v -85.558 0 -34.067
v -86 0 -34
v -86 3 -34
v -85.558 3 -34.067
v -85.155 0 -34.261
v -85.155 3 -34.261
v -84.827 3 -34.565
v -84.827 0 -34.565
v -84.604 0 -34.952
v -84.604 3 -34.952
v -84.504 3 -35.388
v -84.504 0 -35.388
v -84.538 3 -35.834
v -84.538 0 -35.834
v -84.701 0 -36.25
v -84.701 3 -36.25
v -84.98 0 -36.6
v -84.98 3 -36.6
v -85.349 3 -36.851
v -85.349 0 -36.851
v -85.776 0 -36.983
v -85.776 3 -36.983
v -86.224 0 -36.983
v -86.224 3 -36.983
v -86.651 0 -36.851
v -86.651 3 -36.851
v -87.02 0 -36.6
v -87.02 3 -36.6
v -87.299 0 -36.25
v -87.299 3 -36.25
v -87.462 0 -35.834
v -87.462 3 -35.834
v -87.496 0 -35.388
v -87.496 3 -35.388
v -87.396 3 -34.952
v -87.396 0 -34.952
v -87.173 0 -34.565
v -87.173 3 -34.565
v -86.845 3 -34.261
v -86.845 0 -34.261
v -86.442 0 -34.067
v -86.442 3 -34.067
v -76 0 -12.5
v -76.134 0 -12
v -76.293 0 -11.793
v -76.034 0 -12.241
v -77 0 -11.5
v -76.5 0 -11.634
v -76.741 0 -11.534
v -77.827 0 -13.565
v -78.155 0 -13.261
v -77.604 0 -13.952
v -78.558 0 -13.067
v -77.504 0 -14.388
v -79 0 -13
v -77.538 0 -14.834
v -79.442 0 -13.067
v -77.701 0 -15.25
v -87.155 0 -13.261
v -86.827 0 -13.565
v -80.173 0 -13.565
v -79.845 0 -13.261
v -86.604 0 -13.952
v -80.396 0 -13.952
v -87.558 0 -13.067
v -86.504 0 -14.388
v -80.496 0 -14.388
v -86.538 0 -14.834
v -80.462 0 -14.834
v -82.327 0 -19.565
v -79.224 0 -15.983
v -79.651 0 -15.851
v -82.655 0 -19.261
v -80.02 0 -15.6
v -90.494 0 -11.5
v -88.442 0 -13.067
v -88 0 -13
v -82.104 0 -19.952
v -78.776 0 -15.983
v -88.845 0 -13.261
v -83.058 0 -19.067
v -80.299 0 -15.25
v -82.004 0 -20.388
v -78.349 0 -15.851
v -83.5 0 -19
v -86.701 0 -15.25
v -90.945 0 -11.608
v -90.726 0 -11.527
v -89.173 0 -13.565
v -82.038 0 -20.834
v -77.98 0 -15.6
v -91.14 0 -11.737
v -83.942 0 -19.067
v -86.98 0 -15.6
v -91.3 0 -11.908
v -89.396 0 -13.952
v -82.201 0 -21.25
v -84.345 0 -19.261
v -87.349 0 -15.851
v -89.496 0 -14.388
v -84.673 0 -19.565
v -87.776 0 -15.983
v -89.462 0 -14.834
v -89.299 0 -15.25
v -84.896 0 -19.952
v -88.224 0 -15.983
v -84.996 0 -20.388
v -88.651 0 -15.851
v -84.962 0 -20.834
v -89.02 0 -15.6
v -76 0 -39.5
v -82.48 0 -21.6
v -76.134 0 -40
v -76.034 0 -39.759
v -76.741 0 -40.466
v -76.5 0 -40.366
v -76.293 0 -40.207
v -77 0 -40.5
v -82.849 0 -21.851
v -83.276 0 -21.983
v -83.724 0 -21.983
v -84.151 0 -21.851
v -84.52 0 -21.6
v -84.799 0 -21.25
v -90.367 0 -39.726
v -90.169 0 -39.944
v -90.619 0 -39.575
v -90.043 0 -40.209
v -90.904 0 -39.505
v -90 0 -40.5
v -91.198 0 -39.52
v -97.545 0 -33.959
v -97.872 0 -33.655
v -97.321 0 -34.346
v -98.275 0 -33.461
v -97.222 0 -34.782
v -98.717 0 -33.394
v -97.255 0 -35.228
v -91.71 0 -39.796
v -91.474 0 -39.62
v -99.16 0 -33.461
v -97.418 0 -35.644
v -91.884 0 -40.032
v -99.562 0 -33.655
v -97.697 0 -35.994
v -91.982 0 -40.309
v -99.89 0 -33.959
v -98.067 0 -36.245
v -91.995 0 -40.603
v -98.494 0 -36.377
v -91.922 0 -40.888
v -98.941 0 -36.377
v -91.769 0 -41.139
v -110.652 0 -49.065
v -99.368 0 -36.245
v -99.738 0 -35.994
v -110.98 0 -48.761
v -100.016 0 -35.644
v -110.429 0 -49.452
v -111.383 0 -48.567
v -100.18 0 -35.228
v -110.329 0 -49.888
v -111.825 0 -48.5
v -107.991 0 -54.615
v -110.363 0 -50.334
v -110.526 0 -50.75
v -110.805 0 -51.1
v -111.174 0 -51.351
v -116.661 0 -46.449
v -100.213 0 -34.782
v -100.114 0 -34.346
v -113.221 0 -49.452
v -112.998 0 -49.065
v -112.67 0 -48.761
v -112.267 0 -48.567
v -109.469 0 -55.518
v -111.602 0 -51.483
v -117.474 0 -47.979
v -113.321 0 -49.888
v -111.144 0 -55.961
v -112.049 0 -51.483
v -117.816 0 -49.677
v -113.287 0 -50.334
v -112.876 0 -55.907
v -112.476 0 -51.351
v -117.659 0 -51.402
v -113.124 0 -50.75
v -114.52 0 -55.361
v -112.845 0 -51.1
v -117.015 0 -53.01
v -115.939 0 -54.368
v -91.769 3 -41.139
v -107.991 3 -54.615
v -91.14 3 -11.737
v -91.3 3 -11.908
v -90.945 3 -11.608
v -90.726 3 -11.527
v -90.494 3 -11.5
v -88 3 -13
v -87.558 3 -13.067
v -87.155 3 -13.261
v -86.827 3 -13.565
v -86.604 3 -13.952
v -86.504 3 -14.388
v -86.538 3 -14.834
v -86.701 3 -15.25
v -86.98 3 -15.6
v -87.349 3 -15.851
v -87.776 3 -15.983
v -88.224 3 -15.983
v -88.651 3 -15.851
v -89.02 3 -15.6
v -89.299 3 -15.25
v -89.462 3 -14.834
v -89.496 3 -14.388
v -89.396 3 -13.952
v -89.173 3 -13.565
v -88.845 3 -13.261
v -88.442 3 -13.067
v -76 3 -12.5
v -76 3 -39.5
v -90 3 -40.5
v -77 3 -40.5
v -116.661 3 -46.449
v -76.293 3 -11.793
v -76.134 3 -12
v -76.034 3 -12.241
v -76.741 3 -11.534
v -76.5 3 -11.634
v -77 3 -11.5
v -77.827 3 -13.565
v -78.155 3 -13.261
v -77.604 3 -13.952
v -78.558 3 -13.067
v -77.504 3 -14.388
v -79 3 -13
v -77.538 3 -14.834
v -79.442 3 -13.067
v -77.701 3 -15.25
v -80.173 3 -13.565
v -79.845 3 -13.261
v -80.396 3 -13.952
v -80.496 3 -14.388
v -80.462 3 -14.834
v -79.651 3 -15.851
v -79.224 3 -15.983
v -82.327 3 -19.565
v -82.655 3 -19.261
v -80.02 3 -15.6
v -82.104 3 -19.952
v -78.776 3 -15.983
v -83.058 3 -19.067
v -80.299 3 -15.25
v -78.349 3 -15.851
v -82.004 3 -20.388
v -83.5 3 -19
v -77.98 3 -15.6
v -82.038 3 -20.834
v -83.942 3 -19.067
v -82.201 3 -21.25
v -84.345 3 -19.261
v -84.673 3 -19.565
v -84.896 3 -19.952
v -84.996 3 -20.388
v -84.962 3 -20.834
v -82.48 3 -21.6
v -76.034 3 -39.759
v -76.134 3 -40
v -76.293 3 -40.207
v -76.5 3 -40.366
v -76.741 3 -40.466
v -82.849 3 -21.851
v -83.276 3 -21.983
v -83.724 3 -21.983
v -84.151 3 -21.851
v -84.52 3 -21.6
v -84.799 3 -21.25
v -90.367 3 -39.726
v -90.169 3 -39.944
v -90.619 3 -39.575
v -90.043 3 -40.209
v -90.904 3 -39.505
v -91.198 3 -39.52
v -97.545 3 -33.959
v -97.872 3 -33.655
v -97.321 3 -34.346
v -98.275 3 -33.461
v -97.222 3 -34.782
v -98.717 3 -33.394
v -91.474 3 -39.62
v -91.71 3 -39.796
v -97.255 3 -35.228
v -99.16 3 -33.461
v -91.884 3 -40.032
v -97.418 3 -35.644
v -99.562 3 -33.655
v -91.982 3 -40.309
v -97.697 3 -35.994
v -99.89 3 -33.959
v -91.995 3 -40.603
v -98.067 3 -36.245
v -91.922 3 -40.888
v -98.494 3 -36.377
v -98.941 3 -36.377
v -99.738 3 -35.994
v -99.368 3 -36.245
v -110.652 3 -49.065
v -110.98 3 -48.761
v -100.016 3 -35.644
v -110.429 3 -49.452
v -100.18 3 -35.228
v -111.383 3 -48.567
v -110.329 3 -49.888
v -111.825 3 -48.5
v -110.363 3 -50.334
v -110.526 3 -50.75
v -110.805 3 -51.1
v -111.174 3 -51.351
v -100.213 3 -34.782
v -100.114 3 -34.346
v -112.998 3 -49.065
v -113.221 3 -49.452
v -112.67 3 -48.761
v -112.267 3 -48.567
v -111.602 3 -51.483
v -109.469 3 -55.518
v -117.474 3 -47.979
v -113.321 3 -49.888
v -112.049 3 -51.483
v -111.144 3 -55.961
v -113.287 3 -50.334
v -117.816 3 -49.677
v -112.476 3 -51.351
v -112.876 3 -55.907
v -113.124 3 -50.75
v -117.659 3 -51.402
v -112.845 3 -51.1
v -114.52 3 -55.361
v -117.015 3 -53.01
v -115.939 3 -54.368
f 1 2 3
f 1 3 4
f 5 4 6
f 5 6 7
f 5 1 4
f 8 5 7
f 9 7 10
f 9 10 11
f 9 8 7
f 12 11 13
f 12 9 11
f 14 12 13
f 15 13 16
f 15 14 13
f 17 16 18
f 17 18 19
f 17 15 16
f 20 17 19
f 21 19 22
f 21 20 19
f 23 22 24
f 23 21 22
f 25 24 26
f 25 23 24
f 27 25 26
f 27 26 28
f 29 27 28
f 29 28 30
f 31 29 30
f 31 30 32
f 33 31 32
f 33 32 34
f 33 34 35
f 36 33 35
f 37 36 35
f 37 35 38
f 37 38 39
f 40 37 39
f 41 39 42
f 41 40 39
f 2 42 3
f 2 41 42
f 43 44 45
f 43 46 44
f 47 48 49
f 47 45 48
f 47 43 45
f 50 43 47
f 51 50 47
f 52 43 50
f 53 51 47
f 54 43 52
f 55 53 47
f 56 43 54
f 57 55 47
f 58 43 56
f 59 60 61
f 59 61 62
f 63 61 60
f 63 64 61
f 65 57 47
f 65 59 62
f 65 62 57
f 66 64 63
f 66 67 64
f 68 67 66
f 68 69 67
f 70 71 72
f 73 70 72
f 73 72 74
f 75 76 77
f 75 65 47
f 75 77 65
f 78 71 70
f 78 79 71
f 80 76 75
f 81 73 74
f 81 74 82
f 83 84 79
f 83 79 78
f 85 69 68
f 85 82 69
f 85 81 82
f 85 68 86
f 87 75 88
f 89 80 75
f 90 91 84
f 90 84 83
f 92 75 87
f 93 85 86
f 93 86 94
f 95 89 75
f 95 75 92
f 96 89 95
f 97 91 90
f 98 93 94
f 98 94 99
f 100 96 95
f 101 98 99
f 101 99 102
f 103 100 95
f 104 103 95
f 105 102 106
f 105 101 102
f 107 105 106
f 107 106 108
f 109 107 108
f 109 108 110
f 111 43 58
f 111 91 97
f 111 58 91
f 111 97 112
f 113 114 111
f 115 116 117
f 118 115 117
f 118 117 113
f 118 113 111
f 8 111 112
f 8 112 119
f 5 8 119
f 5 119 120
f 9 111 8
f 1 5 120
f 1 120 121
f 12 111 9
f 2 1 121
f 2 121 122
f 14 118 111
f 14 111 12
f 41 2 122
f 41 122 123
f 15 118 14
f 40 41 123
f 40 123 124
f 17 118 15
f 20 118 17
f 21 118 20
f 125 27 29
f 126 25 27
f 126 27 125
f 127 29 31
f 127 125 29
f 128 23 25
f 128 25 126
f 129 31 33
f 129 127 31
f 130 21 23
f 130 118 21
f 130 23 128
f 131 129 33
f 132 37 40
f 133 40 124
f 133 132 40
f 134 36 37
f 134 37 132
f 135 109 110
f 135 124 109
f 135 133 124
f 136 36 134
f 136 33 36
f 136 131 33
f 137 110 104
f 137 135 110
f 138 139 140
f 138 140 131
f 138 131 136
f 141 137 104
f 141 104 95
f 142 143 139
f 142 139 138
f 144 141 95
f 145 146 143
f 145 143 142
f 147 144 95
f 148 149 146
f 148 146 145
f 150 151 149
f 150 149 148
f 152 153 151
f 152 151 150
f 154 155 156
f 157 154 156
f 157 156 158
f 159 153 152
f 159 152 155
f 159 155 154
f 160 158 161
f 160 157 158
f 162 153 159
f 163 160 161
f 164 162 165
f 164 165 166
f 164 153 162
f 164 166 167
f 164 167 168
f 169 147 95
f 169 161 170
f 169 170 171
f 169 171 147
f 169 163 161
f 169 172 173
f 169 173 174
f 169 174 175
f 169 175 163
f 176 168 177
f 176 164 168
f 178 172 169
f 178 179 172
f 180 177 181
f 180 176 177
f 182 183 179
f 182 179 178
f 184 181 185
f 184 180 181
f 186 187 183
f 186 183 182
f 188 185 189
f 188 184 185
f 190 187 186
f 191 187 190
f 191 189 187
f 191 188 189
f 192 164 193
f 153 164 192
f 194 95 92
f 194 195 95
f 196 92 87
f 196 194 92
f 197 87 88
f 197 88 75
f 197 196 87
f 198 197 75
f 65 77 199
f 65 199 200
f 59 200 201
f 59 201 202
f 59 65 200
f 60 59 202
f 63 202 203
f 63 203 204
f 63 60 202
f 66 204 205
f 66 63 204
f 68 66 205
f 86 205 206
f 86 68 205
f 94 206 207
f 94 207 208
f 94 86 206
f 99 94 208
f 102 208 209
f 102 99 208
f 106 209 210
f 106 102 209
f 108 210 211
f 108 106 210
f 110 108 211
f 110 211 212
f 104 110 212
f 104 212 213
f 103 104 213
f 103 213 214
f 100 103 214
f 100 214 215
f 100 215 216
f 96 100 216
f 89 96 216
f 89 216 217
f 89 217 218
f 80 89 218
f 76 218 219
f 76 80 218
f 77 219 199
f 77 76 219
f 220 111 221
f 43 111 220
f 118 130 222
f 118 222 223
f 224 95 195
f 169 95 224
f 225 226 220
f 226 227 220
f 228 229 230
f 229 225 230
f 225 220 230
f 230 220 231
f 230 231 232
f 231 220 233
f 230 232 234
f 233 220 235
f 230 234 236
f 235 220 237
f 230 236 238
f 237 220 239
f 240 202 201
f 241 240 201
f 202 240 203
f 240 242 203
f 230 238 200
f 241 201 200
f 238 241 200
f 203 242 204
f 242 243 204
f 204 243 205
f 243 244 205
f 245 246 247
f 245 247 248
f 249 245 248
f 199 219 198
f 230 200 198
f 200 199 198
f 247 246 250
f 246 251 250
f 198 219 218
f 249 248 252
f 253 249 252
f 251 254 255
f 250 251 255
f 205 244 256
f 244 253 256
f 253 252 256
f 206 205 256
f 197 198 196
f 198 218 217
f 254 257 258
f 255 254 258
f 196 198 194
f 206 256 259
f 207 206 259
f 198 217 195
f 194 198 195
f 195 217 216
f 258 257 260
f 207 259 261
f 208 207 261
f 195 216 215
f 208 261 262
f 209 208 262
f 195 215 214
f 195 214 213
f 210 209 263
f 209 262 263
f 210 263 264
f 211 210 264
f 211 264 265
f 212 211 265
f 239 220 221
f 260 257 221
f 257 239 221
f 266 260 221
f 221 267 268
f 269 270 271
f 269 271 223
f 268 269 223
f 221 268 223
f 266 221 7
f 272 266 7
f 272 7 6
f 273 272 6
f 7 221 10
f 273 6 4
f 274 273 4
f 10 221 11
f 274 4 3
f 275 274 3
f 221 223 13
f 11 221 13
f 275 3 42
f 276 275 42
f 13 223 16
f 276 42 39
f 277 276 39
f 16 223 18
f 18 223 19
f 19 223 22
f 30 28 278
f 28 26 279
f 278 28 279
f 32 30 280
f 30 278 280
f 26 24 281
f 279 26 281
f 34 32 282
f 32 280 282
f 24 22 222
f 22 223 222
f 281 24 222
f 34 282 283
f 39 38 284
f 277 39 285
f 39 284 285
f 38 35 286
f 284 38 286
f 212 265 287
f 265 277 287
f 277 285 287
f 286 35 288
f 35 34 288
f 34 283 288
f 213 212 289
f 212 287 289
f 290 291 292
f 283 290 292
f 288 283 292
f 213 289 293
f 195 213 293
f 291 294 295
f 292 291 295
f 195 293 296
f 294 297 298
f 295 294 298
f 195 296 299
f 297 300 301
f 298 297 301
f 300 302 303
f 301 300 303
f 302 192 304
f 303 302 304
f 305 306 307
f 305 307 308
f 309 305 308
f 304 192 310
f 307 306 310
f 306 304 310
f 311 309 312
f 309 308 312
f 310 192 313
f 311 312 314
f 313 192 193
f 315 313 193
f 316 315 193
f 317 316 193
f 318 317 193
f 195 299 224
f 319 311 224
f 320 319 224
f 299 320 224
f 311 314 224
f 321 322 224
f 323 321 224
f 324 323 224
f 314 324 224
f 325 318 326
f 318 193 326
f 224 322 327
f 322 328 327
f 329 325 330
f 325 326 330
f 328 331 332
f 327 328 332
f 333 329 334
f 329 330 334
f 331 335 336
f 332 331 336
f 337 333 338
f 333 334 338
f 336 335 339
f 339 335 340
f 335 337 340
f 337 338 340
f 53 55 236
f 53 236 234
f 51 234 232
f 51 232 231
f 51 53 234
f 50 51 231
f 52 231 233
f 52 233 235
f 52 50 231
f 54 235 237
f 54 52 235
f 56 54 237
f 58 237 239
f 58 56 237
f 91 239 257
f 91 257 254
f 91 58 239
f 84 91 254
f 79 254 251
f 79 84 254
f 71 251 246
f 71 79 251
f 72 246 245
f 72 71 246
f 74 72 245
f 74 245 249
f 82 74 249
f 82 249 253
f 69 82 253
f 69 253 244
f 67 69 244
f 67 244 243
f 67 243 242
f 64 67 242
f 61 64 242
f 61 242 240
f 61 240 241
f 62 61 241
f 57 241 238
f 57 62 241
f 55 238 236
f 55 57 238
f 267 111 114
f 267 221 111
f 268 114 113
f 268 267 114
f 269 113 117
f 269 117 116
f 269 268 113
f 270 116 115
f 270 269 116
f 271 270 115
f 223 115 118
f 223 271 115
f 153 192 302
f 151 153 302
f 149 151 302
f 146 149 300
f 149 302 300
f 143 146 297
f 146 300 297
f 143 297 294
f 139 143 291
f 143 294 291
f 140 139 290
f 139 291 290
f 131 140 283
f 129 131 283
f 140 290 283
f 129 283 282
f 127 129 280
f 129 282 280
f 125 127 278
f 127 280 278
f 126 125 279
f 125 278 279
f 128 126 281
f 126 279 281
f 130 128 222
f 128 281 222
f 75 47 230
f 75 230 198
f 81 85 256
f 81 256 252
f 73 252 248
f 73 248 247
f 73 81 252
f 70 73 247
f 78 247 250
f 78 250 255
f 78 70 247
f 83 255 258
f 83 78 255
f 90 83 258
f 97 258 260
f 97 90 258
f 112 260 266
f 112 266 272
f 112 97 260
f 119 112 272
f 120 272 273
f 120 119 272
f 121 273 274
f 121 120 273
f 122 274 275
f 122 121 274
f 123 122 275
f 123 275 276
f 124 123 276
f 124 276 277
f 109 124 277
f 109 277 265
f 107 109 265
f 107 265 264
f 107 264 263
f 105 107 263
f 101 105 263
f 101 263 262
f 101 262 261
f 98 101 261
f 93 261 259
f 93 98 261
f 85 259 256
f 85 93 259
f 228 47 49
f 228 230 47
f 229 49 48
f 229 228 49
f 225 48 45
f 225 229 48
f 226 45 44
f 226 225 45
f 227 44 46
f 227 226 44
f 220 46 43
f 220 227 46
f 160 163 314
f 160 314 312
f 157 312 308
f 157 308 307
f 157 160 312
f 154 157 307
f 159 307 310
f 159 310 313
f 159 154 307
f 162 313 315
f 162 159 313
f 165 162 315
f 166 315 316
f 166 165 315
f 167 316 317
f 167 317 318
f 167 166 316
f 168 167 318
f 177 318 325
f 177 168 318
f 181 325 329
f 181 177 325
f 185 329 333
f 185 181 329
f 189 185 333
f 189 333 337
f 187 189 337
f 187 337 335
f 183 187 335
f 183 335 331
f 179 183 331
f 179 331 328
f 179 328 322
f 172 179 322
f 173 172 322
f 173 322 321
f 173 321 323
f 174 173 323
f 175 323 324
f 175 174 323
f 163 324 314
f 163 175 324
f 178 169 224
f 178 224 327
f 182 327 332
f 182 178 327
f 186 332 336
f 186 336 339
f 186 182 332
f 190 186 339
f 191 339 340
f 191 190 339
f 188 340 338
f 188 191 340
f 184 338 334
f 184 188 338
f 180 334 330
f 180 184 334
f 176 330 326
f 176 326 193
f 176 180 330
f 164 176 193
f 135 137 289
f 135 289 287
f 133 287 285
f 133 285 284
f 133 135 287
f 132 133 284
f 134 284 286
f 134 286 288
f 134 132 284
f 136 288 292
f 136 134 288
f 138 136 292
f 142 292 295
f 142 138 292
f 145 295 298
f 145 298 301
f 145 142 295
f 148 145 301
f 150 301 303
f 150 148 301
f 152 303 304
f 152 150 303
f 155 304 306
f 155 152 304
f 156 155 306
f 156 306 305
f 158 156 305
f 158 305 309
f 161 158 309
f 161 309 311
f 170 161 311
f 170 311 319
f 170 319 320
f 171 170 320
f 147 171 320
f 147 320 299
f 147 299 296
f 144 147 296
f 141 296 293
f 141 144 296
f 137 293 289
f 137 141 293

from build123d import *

# Parameters (mm, degrees)
SKETCH_1_R          = 1.5
EXTRUDE_1_DEPTH     = 3
SKETCH_3_R          = 1
CUT_EXTRUDE_2_DEPTH = 131.490420233
FILLET_1_R          = 1


with BuildPart() as part:
    # 草图1 → 凸台-拉伸1 (new body)
    with BuildSketch(Plane(origin=(0, 0, 0), x_dir=(1, 0, 0), z_dir=(0, 1, 0))):
        with BuildLine():
            Line((-107.991031726, 54.61519926), (-91, 40.5))
            Line((-91, 40.5), (-76, 40.5))
            Line((-76, 40.5), (-76, 11.5))
            Line((-76, 11.5), (-91, 11.5))
            Line((-91, 11.5), (-116.661386977, 46.448923126))
            ThreePointArc((-116.661386977, 46.448923126), (-115.938856388, 54.367705823), (-107.991031726, 54.61519926))
        make_face()
        with Locations(Location((-111.825081255, 50, 0), (0, 0, 270))):
            Circle(SKETCH_1_R, mode=Mode.SUBTRACT)
        with Locations(Location((-88, 14.5, 0), (0, 0, 270))):
            Circle(SKETCH_1_R, mode=Mode.SUBTRACT)
        with Locations(Location((-79, 14.5, 0), (0, 0, 270))):
            Circle(SKETCH_1_R, mode=Mode.SUBTRACT)
        with Locations(Location((-83.5, 20.5, 0), (0, 0, 270))):
            Circle(SKETCH_1_R, mode=Mode.SUBTRACT)
        with Locations(Location((-86, 35.5, 0), (0, 0, 270))):
            Circle(SKETCH_1_R, mode=Mode.SUBTRACT)
        with Locations(Location((-98.71745767, 34.89403416, 0), (0, 0, 270))):
            Circle(SKETCH_1_R, mode=Mode.SUBTRACT)
    extrude(amount=EXTRUDE_1_DEPTH)

    # 草图3 → 切除-拉伸2 (cut, through all)
    with BuildSketch(Plane(origin=(0, 3, 0), x_dir=(1, 0, 0), z_dir=(0, 1, 0))):
        with Locations((-91, 40.5)):
            Circle(SKETCH_3_R)
    extrude(amount=-CUT_EXTRUDE_2_DEPTH, mode=Mode.SUBTRACT)

    # 圆角1
    fillet_1_edges = [part.edges().sort_by_distance(p)[0] for p in [
        (-76, 1.5, -40.5),
        (-76, 1.5, -11.5),
        (-91, 1.5, -11.5),
    ]]
    fillet(fillet_1_edges, radius=FILLET_1_R)


solid = part.part
